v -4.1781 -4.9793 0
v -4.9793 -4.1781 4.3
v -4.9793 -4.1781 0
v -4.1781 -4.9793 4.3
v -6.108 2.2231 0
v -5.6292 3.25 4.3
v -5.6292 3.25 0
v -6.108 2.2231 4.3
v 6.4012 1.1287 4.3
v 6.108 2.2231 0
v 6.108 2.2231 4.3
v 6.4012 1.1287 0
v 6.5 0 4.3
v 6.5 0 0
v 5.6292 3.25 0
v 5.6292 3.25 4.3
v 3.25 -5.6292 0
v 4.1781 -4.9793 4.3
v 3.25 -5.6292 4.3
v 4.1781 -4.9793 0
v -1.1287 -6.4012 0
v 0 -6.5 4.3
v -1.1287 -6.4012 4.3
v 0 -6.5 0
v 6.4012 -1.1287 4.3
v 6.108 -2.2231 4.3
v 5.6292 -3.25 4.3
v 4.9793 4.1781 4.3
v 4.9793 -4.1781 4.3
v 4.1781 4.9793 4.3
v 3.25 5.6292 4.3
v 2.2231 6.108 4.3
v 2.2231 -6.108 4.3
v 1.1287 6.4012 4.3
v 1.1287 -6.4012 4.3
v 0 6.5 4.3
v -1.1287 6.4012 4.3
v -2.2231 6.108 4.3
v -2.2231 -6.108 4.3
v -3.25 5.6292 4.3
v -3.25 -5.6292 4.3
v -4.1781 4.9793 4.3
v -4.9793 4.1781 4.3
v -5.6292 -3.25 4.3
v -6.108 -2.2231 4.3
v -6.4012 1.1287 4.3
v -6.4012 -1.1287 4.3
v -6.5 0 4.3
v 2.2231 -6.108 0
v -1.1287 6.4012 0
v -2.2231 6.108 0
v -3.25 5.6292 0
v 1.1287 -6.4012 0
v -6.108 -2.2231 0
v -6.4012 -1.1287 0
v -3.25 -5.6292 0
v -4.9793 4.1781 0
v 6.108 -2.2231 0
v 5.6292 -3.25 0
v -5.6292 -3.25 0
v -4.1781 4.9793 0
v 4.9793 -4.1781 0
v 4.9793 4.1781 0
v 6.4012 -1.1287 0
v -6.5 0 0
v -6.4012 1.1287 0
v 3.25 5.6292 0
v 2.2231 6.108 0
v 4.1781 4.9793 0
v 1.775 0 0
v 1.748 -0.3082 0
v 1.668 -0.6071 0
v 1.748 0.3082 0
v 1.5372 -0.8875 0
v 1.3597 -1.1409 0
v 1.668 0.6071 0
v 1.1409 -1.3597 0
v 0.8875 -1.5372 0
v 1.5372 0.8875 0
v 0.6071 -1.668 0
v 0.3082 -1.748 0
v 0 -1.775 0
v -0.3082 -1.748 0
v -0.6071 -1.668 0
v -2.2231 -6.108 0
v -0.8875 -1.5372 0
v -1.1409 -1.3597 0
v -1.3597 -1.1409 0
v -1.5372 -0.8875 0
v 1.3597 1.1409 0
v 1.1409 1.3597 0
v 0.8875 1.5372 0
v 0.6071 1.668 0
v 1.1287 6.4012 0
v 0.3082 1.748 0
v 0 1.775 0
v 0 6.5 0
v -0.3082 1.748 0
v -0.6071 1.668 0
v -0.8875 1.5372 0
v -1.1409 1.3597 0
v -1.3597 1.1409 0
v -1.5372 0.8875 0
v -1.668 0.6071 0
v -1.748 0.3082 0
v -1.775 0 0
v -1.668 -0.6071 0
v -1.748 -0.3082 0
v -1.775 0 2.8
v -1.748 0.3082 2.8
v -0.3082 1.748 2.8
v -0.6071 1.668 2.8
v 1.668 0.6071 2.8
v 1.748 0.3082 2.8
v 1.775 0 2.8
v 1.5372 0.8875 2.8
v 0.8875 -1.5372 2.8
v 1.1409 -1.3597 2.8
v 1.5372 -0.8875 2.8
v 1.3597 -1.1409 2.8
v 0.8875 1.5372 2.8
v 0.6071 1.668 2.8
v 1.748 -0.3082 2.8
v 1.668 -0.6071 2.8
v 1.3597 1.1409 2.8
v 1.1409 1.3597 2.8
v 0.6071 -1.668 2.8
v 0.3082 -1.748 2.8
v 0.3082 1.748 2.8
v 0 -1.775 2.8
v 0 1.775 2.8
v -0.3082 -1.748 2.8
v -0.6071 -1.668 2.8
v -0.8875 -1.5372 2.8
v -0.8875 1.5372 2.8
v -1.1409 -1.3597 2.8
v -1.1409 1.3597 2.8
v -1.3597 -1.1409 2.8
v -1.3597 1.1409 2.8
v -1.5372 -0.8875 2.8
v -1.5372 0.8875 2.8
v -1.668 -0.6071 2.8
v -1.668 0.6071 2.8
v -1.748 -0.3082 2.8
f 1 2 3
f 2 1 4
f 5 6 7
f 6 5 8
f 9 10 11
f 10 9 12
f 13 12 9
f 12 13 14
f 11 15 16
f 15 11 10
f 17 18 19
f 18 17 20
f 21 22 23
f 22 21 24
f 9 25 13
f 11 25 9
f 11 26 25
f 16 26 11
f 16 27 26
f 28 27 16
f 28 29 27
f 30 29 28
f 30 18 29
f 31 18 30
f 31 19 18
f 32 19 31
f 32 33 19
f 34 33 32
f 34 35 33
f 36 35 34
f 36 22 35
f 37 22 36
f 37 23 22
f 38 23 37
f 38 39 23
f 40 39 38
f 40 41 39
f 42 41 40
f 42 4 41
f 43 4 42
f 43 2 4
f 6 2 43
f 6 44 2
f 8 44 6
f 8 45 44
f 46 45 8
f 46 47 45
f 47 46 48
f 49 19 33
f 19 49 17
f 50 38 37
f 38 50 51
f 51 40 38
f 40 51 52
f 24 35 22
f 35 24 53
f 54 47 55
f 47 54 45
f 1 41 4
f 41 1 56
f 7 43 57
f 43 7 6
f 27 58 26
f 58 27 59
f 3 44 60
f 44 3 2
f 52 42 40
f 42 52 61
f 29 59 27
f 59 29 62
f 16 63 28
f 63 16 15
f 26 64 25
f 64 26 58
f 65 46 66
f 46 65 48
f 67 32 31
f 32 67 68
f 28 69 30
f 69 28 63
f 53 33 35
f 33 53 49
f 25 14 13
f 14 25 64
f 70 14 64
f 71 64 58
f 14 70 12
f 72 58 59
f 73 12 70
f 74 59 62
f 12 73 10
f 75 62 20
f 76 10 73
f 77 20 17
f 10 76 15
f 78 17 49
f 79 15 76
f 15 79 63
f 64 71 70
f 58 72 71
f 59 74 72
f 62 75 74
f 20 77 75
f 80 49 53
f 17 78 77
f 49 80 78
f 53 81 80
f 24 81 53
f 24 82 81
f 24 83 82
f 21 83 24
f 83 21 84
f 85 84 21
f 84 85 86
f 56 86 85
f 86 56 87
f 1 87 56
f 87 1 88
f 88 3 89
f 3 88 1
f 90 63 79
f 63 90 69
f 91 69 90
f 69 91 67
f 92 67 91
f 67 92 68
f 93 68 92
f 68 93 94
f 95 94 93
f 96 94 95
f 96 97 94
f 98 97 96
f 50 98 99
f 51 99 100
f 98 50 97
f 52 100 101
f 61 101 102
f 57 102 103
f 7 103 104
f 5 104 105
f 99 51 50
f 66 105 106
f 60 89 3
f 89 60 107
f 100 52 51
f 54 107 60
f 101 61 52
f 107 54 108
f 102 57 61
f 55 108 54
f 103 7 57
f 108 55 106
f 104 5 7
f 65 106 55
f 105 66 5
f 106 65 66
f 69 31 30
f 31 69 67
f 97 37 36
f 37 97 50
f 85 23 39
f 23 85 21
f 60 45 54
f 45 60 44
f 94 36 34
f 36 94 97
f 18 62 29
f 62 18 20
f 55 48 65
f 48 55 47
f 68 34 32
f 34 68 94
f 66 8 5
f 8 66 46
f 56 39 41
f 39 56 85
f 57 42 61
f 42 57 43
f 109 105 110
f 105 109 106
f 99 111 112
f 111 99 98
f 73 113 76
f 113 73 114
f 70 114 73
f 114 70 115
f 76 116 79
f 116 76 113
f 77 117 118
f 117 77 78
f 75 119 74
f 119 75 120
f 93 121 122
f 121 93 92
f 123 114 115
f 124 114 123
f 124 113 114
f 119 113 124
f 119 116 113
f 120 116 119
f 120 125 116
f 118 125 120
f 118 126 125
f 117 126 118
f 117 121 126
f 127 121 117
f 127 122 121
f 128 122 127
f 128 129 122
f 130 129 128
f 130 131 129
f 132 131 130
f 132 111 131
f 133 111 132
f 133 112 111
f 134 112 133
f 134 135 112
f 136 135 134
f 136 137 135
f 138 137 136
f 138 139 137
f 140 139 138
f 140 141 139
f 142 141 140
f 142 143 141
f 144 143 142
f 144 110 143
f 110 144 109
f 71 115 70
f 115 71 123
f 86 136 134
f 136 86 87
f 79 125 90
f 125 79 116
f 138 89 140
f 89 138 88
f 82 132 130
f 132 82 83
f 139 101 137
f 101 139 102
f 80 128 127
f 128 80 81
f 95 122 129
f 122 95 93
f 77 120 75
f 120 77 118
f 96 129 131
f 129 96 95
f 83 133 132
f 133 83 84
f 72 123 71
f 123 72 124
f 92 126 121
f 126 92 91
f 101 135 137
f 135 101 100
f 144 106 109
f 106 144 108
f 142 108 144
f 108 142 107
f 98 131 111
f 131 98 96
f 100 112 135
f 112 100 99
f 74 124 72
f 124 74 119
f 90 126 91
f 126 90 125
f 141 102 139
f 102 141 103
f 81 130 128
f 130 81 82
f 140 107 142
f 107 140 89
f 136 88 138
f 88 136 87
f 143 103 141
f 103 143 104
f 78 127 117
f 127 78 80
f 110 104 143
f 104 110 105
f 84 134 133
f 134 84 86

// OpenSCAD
$fn = 36;
button_r = 3.35/2;

hole_r = 10/2;
h = 4;
little_h = 3;

button_travel = 0.3;

button_extra = 0.1;

hole_extra = 3/2;


// white one, good
module button_cover() {
    difference() {
    
        // hole
        cylinder(h=h+button_travel, r=hole_r+hole_extra);
        // button
        #cylinder(h=little_h-0.2, r=button_r+button_extra);
    }

}

module main() {

    button_cover();
    
}

main();
